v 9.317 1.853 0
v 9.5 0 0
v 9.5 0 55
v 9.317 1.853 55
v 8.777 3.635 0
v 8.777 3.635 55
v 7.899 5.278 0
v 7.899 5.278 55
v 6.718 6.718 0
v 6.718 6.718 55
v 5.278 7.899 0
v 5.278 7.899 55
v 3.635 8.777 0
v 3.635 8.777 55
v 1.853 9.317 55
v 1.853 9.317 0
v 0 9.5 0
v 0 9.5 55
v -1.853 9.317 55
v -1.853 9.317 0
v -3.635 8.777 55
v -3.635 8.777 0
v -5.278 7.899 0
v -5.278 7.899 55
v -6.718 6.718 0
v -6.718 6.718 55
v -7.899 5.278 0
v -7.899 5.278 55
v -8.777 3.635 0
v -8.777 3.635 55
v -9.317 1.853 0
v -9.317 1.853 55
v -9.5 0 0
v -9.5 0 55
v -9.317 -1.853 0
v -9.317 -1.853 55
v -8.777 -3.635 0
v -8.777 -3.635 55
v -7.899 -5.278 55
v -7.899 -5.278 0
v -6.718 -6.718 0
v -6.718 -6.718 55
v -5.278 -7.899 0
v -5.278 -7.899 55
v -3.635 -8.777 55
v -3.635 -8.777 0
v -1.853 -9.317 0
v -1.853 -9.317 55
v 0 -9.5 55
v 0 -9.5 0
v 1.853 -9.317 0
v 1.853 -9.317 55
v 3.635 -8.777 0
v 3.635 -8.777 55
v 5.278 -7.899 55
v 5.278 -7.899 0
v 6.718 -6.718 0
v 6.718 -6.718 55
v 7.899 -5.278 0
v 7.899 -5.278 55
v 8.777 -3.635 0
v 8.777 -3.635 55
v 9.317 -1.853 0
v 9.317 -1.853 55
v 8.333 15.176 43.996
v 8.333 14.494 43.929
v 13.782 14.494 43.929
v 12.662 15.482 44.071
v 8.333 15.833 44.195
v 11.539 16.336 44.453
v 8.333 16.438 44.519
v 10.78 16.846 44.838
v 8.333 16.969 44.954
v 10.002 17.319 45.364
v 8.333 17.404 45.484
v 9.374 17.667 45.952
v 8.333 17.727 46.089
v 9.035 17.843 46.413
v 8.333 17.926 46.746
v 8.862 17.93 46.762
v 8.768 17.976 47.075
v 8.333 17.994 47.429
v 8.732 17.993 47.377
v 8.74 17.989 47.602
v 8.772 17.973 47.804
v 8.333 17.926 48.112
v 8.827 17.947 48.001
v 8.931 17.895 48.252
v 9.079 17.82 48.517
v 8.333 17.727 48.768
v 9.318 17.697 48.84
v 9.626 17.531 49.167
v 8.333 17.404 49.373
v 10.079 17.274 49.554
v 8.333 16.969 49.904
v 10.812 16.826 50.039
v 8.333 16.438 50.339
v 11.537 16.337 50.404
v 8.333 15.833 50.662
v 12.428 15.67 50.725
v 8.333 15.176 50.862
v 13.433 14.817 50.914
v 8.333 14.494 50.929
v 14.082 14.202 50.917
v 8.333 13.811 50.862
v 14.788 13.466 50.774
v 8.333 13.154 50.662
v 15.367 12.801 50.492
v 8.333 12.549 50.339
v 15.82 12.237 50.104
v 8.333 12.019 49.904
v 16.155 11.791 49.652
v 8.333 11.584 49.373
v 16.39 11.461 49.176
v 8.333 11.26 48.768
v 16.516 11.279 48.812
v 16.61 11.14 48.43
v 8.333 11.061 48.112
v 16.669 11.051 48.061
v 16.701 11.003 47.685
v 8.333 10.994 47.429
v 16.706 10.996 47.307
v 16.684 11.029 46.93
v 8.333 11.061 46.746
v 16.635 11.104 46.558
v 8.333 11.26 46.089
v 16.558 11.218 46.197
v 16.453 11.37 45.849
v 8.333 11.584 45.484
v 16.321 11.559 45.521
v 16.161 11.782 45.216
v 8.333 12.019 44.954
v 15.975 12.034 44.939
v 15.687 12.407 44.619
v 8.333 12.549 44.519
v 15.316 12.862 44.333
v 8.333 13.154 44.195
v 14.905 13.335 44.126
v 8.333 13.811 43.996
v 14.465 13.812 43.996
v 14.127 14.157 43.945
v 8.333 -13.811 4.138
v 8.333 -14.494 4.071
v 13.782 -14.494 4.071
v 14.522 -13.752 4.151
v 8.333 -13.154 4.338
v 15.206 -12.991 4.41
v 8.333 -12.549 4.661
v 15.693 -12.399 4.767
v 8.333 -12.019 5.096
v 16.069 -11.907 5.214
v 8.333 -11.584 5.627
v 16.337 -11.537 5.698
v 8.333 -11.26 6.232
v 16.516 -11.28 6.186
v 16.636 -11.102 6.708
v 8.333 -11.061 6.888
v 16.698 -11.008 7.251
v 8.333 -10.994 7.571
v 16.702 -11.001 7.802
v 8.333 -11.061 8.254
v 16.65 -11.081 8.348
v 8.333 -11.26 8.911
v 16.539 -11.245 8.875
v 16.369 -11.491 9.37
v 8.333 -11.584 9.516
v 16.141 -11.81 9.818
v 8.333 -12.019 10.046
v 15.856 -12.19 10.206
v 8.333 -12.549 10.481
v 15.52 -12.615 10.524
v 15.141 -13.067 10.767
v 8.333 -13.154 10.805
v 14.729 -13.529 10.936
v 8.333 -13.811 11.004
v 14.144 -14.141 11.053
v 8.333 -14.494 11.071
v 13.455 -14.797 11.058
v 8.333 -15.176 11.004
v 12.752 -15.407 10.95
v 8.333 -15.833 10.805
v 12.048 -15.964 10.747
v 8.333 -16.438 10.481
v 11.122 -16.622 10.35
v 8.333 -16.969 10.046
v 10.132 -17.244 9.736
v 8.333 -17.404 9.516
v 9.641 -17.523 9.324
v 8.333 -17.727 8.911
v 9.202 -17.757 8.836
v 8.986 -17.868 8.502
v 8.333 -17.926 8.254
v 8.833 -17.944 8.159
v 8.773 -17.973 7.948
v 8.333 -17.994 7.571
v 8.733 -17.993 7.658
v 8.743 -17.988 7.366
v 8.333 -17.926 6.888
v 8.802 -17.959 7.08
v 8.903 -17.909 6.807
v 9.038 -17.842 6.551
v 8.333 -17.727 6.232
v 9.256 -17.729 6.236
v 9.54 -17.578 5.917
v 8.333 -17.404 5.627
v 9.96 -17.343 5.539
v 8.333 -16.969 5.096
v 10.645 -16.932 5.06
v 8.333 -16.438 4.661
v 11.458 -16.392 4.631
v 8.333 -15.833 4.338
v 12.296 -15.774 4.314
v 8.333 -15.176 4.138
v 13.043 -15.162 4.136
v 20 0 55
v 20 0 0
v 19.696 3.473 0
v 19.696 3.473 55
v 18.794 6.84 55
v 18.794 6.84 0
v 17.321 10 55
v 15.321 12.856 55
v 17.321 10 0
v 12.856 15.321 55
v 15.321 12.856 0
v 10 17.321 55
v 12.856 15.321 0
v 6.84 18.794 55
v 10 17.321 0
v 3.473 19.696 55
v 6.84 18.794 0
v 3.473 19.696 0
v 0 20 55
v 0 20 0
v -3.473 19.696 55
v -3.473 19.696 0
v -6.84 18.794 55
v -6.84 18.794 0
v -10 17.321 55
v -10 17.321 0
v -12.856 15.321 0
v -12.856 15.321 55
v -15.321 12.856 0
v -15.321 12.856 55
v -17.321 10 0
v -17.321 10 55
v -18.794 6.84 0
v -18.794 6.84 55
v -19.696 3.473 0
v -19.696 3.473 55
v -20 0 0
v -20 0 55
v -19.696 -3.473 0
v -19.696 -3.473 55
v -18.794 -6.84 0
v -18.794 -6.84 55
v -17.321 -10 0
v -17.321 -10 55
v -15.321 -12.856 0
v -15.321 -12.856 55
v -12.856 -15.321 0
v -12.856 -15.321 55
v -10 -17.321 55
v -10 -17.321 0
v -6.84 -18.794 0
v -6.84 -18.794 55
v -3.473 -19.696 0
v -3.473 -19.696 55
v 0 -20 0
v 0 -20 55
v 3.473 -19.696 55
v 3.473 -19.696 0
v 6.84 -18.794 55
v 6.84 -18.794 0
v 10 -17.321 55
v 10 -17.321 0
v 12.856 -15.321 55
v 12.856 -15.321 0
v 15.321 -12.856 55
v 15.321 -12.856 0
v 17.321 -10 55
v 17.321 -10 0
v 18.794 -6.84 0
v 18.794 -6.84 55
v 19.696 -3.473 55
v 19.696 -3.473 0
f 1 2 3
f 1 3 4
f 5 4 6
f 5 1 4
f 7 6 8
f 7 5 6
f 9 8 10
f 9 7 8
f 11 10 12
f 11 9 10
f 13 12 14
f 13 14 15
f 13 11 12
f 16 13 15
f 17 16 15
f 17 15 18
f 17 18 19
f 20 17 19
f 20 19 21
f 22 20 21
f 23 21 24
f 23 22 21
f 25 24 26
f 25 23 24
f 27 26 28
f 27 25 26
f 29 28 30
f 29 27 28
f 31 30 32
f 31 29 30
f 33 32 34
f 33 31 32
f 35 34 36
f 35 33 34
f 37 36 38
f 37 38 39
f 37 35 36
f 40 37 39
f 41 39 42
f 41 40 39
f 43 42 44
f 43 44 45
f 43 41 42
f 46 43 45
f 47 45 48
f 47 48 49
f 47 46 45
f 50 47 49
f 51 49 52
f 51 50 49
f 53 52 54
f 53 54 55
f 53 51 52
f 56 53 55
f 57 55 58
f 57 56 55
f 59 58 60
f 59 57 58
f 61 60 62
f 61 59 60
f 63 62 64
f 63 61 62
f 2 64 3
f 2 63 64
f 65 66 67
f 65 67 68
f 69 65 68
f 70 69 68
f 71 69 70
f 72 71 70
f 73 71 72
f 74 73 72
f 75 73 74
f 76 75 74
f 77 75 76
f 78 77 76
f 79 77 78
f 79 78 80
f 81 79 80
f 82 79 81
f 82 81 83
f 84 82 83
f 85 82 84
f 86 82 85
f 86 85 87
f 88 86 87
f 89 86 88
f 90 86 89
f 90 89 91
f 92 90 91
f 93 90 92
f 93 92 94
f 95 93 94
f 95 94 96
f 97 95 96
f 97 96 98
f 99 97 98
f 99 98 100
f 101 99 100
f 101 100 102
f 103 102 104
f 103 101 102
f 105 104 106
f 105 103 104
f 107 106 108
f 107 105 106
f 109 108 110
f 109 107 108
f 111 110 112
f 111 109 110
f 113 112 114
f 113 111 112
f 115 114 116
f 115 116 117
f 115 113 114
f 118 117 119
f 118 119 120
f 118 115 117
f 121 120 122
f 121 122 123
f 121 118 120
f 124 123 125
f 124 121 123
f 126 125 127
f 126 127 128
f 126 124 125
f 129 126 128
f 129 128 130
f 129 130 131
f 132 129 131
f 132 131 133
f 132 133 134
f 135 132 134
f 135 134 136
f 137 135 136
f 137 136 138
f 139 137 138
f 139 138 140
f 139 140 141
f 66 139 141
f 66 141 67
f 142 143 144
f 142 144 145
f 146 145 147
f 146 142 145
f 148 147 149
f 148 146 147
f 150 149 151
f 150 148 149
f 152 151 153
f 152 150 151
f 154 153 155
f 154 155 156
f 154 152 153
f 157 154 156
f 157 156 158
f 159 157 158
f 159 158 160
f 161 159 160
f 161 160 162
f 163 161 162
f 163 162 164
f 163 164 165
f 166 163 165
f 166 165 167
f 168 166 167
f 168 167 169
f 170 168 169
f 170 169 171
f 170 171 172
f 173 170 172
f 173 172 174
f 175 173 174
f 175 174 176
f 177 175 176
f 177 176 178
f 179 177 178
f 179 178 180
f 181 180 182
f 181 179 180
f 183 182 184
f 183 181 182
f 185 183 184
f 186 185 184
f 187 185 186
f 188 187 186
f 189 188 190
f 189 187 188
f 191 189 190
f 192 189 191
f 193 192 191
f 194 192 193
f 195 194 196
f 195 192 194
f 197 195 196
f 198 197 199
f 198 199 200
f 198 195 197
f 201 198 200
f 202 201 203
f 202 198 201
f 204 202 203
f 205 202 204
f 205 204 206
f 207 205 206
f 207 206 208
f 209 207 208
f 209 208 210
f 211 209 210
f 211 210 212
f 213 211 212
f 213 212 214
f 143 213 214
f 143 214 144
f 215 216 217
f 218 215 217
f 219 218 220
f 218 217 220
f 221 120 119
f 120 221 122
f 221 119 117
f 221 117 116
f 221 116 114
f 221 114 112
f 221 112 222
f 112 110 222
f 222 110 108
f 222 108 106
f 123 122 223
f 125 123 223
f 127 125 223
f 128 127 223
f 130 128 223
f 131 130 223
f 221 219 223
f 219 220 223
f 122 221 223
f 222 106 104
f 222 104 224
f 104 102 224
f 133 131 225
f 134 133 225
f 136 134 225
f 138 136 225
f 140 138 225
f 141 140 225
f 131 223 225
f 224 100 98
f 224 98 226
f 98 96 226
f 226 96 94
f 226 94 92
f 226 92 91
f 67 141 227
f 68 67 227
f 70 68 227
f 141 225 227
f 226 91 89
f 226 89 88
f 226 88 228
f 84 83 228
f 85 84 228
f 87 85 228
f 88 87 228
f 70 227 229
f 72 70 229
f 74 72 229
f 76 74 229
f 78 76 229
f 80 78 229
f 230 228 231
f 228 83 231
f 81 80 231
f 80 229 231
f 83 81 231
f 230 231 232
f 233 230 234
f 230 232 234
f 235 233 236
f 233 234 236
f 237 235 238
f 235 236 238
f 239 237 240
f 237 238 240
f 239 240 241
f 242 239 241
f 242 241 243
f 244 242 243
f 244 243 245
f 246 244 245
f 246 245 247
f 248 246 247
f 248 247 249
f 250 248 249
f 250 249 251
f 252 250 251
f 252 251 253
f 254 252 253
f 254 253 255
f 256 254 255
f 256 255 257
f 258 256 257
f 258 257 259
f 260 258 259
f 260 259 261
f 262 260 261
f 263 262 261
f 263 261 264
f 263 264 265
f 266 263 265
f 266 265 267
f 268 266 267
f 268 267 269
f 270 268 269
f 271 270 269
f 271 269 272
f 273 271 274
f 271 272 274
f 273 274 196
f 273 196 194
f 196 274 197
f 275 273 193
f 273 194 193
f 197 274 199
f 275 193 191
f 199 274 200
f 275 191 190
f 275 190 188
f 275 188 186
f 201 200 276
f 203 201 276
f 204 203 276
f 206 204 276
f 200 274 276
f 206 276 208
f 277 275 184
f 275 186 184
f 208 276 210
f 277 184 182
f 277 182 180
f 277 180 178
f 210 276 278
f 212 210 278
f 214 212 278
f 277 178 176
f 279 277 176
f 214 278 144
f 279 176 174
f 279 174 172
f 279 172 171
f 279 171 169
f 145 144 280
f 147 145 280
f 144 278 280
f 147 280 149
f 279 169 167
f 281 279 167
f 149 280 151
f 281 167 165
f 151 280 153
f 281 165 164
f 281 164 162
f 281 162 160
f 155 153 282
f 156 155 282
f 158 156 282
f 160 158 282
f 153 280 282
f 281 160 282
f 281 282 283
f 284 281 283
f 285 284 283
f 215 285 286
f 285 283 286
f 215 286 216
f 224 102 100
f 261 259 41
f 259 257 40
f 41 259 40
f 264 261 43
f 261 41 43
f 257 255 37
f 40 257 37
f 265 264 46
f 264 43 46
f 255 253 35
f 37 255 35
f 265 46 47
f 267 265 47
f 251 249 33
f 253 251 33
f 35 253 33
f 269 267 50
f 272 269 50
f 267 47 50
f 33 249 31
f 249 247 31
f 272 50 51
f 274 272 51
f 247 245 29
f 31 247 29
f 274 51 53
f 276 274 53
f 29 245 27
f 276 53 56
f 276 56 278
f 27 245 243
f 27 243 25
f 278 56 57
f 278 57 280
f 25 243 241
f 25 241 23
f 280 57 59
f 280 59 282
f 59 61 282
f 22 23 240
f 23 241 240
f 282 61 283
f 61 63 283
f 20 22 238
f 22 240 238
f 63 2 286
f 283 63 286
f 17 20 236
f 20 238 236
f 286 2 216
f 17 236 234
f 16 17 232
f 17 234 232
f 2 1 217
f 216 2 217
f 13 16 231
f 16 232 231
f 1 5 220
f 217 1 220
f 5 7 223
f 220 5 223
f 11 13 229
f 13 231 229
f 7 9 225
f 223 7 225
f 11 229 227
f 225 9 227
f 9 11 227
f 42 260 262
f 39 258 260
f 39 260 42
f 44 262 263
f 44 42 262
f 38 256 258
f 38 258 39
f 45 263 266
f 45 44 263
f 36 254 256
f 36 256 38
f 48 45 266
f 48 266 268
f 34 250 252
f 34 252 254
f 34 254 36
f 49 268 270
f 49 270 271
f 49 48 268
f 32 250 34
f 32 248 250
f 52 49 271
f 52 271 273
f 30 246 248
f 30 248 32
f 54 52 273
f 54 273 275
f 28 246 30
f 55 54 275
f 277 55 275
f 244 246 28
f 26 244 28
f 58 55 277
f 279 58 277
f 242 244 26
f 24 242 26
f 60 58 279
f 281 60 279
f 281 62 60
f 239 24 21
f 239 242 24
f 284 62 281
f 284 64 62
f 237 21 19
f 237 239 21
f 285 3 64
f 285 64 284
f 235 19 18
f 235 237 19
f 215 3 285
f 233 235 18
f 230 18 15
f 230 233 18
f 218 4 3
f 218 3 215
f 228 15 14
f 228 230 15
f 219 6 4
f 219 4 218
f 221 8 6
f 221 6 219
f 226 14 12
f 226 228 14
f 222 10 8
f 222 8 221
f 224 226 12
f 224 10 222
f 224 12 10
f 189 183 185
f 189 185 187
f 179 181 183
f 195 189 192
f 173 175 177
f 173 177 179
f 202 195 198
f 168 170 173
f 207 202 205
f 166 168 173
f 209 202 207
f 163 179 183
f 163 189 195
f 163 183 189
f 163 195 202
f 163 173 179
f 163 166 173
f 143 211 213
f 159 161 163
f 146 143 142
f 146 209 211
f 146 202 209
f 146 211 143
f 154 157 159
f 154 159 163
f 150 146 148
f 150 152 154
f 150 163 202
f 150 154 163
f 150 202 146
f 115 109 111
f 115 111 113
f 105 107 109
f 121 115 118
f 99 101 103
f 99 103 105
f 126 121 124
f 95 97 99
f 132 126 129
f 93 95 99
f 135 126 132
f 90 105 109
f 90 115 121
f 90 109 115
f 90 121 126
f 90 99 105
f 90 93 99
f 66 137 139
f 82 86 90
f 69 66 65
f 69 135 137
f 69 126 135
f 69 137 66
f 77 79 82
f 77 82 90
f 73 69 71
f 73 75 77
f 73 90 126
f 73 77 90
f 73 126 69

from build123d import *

# Parameters (mm, degrees)
SKETCH1_R           = 20
SKETCH1_R_2         = 9.5
BOSS_EXTRUDE1_DEPTH = 55
SKETCH2_R           = 3.5
CUT_EXTRUDE1_DEPTH  = 12.66666667


with BuildPart() as part:
    # Sketch1 → Boss-Extrude1 (new body)
    with BuildSketch(Plane.XY):
        Circle(SKETCH1_R)
        Circle(SKETCH1_R_2, mode=Mode.SUBTRACT)
    extrude(amount=BOSS_EXTRUDE1_DEPTH)

    # Sketch2 → Cut-Extrude1 (cut, through all)
    with BuildSketch(Plane(origin=(8.33333333, 0, 0), x_dir=(0, 0, -1), z_dir=(1, 0, 0))):
        with Locations((-47.428775099, 14.493654617)):
            Circle(SKETCH2_R)
        with Locations((-7.571224901, -14.493654617)):
            Circle(SKETCH2_R)
    extrude(amount=CUT_EXTRUDE1_DEPTH, mode=Mode.SUBTRACT)


solid = part.part
